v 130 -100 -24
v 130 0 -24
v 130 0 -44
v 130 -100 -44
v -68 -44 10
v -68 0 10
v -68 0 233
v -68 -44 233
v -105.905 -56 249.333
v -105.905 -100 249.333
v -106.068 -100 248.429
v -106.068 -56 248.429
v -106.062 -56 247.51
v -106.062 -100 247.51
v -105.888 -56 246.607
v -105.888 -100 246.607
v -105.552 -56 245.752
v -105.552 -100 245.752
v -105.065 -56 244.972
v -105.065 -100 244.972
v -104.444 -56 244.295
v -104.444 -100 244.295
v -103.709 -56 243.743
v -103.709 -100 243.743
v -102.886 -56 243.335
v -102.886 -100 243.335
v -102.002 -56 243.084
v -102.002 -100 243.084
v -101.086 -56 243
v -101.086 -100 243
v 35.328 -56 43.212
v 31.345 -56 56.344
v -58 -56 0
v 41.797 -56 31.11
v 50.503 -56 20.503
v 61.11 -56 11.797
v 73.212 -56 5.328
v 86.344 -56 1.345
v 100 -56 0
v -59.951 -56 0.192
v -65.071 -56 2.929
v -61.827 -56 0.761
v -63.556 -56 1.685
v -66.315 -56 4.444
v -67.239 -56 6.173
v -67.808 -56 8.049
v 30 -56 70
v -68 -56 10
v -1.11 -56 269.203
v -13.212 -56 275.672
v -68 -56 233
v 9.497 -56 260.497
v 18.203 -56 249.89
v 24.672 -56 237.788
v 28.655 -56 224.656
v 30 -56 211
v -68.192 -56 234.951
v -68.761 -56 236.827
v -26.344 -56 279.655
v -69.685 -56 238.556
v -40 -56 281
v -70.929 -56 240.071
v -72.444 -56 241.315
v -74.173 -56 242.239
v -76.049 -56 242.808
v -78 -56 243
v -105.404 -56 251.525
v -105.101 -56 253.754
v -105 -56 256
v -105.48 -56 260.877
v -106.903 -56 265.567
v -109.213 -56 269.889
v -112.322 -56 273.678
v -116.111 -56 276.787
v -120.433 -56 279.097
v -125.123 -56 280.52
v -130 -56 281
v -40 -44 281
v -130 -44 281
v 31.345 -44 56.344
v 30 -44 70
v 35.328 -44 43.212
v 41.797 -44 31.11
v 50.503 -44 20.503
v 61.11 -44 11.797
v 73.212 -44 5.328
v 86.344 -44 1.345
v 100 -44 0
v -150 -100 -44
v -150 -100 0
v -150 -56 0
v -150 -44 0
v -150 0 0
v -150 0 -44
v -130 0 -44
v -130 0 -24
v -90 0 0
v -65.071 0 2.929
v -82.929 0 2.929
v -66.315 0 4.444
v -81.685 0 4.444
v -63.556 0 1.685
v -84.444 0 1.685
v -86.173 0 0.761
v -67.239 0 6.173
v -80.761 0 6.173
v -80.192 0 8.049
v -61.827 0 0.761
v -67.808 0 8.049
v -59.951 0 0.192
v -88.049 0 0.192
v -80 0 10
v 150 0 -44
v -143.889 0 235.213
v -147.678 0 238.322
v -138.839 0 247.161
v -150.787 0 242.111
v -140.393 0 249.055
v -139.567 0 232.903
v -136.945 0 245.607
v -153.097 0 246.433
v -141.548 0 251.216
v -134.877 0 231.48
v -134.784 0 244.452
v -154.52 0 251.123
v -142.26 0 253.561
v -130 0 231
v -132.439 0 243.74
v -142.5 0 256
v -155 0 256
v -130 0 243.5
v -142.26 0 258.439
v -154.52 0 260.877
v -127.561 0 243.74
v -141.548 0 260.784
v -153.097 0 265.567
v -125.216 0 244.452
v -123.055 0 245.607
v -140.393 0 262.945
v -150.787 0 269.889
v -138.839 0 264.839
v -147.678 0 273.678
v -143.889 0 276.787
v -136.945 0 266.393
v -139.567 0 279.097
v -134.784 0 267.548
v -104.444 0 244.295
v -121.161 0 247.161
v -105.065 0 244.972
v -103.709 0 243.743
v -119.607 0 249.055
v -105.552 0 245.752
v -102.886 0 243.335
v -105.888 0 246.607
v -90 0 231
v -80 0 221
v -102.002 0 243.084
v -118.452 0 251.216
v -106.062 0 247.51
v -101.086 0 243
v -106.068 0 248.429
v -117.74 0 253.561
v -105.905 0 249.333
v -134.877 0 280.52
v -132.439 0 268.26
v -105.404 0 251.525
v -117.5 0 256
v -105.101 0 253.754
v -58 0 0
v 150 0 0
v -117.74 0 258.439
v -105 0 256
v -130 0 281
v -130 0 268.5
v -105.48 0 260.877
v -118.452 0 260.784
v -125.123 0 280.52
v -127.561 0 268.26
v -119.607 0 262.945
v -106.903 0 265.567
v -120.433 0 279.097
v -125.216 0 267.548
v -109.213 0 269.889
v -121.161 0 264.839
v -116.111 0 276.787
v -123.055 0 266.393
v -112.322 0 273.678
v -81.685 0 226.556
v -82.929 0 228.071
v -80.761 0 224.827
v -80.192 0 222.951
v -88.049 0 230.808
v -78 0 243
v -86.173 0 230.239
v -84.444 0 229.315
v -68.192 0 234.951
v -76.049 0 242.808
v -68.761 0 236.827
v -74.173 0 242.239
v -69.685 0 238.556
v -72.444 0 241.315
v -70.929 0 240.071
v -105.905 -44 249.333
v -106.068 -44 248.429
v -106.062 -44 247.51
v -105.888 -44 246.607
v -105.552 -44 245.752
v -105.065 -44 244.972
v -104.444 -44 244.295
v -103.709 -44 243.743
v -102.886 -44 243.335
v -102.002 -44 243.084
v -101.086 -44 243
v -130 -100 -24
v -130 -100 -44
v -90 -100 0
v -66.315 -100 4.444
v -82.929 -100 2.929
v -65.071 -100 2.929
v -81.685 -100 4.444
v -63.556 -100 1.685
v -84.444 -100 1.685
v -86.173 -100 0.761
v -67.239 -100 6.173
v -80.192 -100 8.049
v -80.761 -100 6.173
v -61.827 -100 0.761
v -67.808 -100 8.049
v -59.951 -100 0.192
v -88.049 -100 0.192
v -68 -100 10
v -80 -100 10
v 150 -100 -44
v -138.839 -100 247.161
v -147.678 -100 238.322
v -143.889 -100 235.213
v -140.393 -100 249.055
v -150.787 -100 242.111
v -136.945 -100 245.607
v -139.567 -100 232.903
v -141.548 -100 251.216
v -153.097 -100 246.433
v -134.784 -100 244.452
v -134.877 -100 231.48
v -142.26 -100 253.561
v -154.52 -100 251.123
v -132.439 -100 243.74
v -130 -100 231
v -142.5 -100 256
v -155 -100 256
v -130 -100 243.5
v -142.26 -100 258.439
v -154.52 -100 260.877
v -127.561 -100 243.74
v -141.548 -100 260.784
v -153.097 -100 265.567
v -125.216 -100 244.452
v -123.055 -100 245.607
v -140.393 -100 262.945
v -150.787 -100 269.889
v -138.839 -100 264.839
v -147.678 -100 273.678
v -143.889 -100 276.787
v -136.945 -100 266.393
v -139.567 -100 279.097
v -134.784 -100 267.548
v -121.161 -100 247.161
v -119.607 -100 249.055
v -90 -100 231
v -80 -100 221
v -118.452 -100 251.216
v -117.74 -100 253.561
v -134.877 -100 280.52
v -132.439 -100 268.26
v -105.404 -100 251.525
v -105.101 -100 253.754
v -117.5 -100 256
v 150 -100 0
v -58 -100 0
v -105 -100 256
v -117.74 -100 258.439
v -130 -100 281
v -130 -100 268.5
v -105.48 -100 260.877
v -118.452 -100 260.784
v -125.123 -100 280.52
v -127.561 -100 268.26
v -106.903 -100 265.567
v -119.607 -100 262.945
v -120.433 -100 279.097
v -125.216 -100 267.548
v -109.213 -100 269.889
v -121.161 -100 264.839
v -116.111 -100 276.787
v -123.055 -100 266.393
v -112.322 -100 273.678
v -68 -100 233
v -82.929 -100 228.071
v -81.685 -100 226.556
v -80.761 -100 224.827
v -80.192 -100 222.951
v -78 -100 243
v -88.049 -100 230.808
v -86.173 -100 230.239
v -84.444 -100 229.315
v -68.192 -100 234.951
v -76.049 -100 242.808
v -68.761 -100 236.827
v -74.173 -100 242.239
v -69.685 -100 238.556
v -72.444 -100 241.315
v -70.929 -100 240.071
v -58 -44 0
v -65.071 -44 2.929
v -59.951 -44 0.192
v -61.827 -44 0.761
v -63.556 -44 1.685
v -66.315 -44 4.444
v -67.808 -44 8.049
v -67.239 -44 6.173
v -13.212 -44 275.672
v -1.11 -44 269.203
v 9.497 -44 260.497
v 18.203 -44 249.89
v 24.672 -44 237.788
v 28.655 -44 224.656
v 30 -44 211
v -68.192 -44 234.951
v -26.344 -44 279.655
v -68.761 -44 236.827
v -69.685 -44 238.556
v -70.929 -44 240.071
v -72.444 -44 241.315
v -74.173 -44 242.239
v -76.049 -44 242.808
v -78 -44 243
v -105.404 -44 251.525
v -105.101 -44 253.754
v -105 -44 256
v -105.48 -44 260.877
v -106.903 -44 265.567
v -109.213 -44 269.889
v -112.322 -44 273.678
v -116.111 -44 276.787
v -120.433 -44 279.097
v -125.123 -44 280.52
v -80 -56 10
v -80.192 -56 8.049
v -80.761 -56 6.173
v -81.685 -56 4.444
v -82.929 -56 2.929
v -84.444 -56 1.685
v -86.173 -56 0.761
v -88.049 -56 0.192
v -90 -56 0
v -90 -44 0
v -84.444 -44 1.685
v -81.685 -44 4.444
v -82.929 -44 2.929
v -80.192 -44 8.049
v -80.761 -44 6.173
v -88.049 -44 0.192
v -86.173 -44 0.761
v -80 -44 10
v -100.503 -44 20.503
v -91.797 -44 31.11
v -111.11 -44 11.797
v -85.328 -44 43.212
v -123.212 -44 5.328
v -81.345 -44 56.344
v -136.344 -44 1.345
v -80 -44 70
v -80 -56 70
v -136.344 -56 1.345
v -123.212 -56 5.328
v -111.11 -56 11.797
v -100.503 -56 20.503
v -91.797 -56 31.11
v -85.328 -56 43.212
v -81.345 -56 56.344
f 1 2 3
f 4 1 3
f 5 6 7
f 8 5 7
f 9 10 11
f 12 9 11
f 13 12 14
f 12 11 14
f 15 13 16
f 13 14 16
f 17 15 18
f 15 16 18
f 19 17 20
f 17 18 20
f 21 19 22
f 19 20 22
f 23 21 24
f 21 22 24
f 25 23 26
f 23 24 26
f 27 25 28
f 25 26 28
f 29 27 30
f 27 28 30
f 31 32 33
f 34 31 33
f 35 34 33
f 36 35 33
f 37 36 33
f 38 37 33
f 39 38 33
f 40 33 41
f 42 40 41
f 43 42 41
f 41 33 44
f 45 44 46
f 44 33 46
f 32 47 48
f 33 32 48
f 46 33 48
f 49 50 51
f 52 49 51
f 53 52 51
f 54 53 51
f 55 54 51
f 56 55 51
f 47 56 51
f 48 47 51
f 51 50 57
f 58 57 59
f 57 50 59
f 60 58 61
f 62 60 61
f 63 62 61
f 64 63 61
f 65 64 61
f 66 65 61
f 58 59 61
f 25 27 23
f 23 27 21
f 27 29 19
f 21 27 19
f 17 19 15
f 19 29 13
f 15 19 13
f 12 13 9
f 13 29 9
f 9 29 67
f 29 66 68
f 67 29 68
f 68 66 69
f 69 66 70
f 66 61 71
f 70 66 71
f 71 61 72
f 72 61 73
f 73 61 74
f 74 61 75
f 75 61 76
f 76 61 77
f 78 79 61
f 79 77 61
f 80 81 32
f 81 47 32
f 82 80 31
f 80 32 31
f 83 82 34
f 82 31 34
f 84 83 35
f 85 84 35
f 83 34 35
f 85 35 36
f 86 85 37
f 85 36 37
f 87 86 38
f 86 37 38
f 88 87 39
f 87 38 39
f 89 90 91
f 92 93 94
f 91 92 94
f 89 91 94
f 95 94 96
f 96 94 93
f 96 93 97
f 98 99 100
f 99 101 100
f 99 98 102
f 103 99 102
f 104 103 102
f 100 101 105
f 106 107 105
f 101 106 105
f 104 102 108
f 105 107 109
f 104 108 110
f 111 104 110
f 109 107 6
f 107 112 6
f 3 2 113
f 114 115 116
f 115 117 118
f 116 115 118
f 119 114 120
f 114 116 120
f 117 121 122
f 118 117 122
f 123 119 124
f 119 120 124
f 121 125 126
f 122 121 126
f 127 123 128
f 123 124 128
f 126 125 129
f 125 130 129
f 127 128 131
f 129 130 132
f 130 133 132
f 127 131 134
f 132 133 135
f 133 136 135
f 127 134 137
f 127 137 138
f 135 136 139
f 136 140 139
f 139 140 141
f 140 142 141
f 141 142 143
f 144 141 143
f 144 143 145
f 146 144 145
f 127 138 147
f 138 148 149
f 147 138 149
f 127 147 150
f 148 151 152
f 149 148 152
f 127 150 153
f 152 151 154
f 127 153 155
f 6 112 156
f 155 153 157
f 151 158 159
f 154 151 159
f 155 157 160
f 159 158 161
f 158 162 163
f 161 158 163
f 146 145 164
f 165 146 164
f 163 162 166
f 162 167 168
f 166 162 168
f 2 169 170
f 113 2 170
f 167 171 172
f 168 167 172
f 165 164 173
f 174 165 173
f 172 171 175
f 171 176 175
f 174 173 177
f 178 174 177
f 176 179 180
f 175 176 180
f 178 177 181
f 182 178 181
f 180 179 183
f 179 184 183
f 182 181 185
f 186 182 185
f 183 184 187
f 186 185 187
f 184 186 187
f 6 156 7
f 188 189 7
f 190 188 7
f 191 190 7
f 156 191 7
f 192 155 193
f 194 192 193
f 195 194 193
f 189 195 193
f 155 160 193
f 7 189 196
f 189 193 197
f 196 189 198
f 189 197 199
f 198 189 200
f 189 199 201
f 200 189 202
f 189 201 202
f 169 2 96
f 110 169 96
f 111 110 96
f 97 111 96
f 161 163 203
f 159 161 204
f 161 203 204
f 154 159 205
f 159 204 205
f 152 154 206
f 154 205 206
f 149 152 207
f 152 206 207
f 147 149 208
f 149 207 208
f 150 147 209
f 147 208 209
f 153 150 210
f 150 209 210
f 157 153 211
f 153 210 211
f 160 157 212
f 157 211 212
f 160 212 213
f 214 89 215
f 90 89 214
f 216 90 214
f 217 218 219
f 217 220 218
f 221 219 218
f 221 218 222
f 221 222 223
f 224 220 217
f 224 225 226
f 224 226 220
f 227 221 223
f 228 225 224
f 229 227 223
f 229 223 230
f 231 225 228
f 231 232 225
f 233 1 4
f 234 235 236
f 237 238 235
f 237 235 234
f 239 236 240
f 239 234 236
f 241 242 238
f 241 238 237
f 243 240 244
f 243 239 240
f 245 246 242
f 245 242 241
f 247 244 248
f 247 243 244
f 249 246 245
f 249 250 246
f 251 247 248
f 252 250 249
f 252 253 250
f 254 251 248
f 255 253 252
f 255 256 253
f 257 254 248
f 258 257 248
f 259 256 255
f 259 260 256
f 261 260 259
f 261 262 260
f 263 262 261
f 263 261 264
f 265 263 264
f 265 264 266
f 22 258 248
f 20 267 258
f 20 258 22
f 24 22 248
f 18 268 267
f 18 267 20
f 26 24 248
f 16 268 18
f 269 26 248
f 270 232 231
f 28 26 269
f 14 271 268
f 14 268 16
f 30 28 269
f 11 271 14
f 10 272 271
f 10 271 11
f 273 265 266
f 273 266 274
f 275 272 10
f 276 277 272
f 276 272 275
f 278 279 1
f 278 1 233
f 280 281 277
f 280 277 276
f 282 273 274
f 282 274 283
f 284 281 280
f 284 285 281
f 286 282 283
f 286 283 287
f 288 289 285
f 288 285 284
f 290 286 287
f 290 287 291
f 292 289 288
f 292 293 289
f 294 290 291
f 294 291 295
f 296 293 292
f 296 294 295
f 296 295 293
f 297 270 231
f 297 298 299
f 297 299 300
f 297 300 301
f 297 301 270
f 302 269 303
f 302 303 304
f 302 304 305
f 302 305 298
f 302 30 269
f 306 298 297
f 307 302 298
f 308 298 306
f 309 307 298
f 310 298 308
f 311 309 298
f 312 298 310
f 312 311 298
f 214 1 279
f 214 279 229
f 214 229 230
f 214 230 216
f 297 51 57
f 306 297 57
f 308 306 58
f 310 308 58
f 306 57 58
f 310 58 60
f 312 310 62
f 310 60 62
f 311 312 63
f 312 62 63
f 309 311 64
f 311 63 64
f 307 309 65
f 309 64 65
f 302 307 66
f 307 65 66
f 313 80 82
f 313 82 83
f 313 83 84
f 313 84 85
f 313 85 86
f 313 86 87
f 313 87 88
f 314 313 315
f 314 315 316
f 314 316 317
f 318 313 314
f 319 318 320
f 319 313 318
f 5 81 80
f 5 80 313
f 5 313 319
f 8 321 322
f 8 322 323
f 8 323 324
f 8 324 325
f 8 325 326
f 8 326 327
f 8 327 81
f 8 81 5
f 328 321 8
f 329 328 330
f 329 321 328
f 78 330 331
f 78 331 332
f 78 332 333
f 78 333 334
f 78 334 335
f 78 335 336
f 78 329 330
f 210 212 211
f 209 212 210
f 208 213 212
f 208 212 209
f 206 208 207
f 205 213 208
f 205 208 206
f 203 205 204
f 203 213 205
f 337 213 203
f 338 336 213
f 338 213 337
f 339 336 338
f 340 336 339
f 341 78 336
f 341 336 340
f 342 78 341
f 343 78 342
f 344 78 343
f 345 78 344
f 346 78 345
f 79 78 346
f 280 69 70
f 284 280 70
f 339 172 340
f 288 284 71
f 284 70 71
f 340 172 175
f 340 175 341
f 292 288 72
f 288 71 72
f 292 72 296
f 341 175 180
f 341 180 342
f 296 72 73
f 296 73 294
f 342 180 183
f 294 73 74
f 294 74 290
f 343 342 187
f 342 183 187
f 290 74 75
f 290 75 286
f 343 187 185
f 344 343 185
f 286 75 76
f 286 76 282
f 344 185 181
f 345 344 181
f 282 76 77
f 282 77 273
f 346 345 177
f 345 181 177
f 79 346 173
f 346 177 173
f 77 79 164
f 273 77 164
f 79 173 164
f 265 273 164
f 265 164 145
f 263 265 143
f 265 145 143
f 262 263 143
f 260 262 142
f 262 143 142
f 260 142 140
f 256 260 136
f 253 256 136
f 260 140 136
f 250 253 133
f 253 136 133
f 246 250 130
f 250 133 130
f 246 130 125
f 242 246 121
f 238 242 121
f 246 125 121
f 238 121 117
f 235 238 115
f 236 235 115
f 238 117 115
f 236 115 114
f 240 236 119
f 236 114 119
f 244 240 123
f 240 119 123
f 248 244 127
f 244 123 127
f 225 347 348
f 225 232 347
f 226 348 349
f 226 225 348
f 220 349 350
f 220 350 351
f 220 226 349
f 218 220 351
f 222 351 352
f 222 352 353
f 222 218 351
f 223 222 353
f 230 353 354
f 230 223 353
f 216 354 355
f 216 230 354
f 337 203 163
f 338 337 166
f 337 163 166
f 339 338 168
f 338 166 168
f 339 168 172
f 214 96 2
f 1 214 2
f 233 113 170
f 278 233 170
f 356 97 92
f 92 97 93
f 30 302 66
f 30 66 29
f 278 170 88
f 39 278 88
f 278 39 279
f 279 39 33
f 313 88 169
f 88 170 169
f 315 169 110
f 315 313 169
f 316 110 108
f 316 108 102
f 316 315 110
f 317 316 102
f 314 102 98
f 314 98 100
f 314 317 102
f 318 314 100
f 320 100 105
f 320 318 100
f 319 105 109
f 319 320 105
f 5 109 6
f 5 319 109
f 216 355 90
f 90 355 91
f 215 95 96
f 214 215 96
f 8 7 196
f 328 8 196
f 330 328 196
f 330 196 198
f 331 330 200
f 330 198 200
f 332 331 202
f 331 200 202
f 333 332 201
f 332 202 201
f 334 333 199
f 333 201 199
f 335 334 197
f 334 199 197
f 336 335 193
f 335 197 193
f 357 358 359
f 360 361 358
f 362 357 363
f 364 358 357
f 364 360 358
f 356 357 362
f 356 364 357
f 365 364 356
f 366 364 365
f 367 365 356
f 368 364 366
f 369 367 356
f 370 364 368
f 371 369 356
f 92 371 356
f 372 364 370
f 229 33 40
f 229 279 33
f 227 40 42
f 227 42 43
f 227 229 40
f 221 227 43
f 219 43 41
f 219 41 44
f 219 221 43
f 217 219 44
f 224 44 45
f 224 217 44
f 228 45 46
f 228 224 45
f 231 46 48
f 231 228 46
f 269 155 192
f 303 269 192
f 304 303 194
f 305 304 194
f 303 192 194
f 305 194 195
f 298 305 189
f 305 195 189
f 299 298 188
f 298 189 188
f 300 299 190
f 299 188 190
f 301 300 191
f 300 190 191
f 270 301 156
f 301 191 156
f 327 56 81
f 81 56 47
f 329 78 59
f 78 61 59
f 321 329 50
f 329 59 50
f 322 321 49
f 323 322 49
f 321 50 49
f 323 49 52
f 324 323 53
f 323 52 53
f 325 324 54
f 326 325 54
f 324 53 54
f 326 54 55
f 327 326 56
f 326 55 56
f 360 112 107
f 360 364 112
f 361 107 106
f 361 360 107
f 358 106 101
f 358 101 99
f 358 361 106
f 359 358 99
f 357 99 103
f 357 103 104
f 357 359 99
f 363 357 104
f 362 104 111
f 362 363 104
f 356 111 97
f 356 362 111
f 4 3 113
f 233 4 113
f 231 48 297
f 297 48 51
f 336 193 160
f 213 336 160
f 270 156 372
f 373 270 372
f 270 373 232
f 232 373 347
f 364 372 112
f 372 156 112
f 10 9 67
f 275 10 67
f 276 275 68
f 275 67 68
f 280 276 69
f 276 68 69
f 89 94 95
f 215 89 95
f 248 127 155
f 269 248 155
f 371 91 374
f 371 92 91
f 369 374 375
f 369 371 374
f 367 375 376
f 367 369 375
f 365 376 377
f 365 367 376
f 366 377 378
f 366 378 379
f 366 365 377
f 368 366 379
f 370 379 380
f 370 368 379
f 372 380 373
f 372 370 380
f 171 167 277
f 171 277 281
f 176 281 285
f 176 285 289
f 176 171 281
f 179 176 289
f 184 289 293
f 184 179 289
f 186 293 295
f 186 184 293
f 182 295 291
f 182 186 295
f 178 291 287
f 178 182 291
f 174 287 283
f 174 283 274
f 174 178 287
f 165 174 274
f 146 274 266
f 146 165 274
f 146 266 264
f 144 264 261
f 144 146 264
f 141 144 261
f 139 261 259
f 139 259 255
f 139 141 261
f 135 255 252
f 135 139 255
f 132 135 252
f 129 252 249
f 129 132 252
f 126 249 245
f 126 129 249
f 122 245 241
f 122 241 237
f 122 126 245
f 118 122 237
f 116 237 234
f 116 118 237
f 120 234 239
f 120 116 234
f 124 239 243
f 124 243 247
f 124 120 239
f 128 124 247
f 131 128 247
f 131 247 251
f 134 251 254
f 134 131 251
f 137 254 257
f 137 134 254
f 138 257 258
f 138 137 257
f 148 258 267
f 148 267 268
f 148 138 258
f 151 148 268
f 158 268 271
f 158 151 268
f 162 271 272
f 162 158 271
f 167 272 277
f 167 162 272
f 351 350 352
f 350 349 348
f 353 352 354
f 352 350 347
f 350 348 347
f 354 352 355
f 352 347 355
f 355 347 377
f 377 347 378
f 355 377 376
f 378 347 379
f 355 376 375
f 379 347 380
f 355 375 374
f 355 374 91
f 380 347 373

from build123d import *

# Parameters (mm, degrees)
F1_DEPTH = 100
F2_R     = 12.5
F3_DEPTH = 100
F4_R     = 5
F7_DEPTH = 6
F8_R     = 10


with BuildPart() as f1:
    # F0 (on Front) → F1 (new body)
    with BuildSketch(Plane.XZ):
        Polygon((-150, 0), (-150, -44), (-130, -44), (-130, -24), (130, -24), (130, -44), (150, -44), (150, 0), align=None)
    extrude(amount=F1_DEPTH)

    # F2 (on Front) → F3 (join)
    with BuildSketch(Plane.XZ):
        with BuildLine():
            Line((-80, 221), (-80, 0))
            Line((-80, 0), (-68, 0))
            Line((-68, 0), (-68, 233))
            ThreePointArc((-68, 233), (-70.9289321881, 240.0710678119), (-78, 243))
            Line((-78, 243), (-108.6458434959, 243))
            ThreePointArc((-108.6458434959, 243), (-117.7525512861, 234.2055052823), (-130, 231))
            Line((-130, 231), (-90, 231))
            ThreePointArc((-90, 231), (-82.9289321881, 228.0710678119), (-80, 221))
        make_face()
        with BuildLine():
            ThreePointArc((-105, 256), (-147.6776695297, 273.6776695297), (-130, 231))
            ThreePointArc((-130, 231), (-117.7525512861, 234.2055052823), (-108.6458434959, 243))
            ThreePointArc((-108.6458434959, 243), (-105.9287109547, 249.2492190304), (-105, 256))
        make_face()
        with Locations((-130, 256)):
            Circle(F2_R, mode=Mode.SUBTRACT)
    extrude(amount=F3_DEPTH)

    # F4
    f4_edges = [f1.edges().sort_by_distance(p)[0] for p in [
        (-108.645843, -50, 243),
    ]]
    fillet(f4_edges, radius=F4_R)

    # F6 (on offset) → F7 (join, symmetric)
    with BuildSketch(Plane(origin=(0, -50, 0), x_dir=(-1, 0, 0), z_dir=(0, 1, 0))):
        with BuildLine():
            ThreePointArc((105.9052795087, 249.3333333333), (110.1044393561, 271.1382517705), (130, 281))
            Line((130, 281), (40, 281))
            ThreePointArc((40, 281), (-9.4974746831, 260.4974746831), (-30, 211))
            Line((-30, 211), (-30, 70))
            ThreePointArc((-30, 70), (-50.5025253169, 20.5025253169), (-100, 0))
            Line((-100, 0), (68, 0))
            Line((68, 0), (68, 233))
            ThreePointArc((68, 233), (70.9289321881, 240.0710678119), (78, 243))
            Line((78, 243), (101.0863354104, 243))
            ThreePointArc((101.0863354104, 243), (105.0654475392, 244.9723496459), (105.9052795087, 249.3333333333))
        make_face()
        with BuildLine():
            ThreePointArc((150, 0), (100.5025253169, 20.5025253169), (80, 70))
            Line((80, 70), (80, 0))
            Line((80, 0), (150, 0))
        make_face()
    extrude(amount=F7_DEPTH, both=True)

    # F8
    f8_edges = [f1.edges().sort_by_distance(p)[0] for p in [
        (-80, -78, 0),
        (-80, -22, 0),
        (-68, -22, 0),
        (-68, -78, 0),
    ]]
    fillet(f8_edges, radius=F8_R)


solid = f1.part
